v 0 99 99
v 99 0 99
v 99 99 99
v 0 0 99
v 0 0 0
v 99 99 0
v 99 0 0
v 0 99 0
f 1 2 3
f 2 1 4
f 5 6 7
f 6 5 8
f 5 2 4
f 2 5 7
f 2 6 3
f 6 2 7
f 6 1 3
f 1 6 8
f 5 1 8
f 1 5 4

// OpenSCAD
$fn = 64;
WALL = 2;
UNUSED = 5;
module box() cube(WALL);
cube(99);
